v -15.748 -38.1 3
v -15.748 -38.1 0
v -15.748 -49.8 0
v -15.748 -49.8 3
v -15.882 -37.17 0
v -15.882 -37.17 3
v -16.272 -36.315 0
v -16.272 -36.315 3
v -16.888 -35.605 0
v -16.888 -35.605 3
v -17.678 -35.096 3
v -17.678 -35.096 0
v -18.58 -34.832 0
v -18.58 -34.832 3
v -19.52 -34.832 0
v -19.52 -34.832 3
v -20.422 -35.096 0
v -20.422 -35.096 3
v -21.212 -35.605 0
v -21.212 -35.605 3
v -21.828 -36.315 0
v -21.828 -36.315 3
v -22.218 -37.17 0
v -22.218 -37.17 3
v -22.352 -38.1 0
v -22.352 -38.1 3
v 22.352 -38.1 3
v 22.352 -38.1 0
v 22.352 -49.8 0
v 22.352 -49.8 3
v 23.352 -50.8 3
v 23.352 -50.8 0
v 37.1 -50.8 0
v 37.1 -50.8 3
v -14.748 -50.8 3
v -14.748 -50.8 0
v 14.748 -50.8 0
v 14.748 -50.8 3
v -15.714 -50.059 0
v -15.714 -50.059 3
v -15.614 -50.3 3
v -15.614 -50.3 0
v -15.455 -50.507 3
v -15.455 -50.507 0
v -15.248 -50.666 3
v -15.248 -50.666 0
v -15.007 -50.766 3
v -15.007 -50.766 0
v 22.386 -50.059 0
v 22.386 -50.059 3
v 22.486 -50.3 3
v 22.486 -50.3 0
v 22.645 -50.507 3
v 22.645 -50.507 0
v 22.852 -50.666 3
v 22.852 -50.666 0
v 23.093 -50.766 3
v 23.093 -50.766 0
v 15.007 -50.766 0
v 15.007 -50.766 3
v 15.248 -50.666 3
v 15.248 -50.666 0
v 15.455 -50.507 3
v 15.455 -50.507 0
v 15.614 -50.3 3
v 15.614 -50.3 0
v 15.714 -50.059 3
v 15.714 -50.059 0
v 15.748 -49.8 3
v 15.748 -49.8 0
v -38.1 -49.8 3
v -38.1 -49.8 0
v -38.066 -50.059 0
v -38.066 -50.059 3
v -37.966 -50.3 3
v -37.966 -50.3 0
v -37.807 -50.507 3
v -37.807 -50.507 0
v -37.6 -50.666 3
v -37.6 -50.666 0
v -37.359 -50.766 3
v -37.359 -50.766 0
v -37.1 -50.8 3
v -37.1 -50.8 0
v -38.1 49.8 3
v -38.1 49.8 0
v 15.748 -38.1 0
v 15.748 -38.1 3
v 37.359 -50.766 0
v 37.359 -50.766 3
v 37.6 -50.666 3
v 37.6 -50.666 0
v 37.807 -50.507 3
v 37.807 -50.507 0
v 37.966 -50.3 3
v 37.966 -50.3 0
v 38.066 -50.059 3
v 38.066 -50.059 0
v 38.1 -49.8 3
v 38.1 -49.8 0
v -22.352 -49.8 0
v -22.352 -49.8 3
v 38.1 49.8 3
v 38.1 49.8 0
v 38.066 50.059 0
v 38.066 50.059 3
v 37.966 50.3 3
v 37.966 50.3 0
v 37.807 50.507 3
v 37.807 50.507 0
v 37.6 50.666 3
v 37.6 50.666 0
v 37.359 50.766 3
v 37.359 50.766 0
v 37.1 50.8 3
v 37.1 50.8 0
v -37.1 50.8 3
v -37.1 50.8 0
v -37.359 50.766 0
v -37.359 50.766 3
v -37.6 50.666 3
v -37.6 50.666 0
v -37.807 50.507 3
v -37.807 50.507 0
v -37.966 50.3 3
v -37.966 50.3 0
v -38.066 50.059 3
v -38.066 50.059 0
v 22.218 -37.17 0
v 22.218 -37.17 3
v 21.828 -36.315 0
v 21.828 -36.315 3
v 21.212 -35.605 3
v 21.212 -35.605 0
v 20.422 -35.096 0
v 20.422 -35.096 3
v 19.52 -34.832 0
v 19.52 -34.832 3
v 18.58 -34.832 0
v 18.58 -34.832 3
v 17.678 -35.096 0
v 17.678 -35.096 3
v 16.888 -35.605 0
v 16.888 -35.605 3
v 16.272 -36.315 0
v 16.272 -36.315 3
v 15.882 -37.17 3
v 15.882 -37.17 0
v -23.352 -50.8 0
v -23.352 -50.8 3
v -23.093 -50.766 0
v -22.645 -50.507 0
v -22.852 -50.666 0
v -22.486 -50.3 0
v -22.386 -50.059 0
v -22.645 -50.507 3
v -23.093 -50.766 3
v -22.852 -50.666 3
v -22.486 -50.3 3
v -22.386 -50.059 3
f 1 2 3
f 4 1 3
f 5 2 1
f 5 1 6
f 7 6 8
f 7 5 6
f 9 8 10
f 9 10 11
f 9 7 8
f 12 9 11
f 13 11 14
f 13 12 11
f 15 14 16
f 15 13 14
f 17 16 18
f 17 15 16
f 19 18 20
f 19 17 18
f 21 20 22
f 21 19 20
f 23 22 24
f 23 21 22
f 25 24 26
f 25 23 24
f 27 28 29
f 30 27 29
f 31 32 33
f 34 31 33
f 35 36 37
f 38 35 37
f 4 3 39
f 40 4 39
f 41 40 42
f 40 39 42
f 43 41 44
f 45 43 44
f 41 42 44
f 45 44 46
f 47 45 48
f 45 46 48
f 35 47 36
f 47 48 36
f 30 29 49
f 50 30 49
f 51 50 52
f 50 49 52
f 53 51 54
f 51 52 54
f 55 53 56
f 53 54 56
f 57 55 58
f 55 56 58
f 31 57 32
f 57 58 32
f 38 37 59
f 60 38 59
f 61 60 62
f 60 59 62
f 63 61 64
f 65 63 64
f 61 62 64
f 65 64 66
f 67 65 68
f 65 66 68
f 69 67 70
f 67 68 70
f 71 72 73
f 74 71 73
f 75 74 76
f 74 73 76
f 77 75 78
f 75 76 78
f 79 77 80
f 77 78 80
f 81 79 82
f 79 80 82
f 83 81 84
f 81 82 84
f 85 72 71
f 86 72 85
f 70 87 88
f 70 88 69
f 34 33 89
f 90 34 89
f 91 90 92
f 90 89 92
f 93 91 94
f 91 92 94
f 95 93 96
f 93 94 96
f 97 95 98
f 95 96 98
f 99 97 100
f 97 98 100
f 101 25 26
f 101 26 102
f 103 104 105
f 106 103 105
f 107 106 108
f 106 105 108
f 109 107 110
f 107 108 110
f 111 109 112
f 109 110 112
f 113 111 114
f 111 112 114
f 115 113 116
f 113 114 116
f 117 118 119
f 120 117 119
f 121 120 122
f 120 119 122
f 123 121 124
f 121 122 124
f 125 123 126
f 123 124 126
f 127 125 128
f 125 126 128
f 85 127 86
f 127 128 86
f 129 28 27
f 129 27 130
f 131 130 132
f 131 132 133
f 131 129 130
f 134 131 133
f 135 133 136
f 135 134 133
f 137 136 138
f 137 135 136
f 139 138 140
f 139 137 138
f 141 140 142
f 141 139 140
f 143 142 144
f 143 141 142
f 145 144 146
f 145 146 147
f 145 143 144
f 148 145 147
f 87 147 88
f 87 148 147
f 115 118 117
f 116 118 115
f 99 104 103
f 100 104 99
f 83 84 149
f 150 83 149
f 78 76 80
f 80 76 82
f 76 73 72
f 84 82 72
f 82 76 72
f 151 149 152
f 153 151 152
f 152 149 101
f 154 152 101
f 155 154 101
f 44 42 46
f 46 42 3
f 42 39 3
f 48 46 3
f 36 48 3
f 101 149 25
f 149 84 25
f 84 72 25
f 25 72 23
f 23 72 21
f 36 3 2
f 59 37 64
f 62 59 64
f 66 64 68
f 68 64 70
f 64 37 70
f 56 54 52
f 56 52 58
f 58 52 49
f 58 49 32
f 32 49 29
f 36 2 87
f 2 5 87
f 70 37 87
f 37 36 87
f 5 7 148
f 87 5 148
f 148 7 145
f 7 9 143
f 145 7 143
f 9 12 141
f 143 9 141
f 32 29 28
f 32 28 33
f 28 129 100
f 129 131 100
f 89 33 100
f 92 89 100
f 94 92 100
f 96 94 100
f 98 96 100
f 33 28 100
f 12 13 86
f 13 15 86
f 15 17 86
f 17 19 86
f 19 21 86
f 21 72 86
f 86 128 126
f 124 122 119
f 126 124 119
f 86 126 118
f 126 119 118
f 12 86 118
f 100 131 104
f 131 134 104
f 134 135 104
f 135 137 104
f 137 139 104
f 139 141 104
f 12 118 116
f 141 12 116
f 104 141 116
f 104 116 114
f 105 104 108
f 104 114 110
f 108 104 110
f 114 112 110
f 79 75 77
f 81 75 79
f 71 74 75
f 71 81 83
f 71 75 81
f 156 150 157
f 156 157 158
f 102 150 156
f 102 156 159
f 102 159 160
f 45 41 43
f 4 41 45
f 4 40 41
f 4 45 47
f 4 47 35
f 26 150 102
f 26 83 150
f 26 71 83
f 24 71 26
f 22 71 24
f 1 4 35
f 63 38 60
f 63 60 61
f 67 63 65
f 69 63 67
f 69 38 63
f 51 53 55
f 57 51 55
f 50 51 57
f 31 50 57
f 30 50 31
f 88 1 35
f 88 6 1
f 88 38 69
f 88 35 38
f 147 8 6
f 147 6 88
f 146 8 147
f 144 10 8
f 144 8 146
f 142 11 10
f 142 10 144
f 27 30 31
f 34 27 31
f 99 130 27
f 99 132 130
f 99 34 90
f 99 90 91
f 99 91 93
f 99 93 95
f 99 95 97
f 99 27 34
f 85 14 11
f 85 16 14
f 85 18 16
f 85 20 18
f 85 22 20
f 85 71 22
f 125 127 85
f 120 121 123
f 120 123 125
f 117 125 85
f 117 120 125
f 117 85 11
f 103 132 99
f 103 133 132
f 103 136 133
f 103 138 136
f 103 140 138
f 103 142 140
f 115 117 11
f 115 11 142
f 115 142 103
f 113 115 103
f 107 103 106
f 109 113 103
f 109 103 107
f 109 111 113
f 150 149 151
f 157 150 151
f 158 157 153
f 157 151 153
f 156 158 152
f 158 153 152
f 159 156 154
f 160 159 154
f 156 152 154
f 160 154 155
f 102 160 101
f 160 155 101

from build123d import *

# Parameters (mm, degrees)
PAD_DEPTH = 3


with BuildPart() as part:
    # Sketch → Pad (new body)
    with BuildSketch(Plane.XY):
        with BuildLine():
            ThreePointArc((-37.1, 50.8), (-37.807107, 50.507107), (-38.1, 49.8))
            Line((-38.1, -49.8), (-38.1, 49.8))
            ThreePointArc((-38.1, -49.8), (-37.807107, -50.507107), (-37.1, -50.8))
            Line((-37.1, -50.8), (-23.352, -50.8))
            ThreePointArc((-23.352, -50.8), (-22.644893, -50.507107), (-22.352, -49.8))
            Line((-22.352, -38.1), (-22.352, -49.8))
            ThreePointArc((-15.748, -38.1), (-19.05, -34.798), (-22.352, -38.1))
            Line((-15.748, -38.1), (-15.748, -49.8))
            ThreePointArc((-15.748, -49.8), (-15.455107, -50.507107), (-14.748, -50.8))
            Line((-14.748, -50.8), (14.748, -50.8))
            ThreePointArc((14.748, -50.8), (15.455107, -50.507107), (15.748, -49.8))
            Line((15.748, -38.1), (15.748, -49.8))
            ThreePointArc((22.352, -38.1), (19.05, -34.798), (15.748, -38.1))
            Line((22.352, -38.1), (22.352, -49.8))
            ThreePointArc((22.352, -49.8), (22.644893, -50.507107), (23.352, -50.8))
            Line((23.352, -50.8), (37.1, -50.8))
            ThreePointArc((37.1, -50.8), (37.807107, -50.507107), (38.1, -49.8))
            Line((38.1, 49.8), (38.1, -49.8))
            ThreePointArc((38.1, 49.8), (37.807107, 50.507107), (37.1, 50.8))
            Line((-37.1, 50.8), (37.1, 50.8))
        make_face()
    extrude(amount=PAD_DEPTH)


solid = part.part
